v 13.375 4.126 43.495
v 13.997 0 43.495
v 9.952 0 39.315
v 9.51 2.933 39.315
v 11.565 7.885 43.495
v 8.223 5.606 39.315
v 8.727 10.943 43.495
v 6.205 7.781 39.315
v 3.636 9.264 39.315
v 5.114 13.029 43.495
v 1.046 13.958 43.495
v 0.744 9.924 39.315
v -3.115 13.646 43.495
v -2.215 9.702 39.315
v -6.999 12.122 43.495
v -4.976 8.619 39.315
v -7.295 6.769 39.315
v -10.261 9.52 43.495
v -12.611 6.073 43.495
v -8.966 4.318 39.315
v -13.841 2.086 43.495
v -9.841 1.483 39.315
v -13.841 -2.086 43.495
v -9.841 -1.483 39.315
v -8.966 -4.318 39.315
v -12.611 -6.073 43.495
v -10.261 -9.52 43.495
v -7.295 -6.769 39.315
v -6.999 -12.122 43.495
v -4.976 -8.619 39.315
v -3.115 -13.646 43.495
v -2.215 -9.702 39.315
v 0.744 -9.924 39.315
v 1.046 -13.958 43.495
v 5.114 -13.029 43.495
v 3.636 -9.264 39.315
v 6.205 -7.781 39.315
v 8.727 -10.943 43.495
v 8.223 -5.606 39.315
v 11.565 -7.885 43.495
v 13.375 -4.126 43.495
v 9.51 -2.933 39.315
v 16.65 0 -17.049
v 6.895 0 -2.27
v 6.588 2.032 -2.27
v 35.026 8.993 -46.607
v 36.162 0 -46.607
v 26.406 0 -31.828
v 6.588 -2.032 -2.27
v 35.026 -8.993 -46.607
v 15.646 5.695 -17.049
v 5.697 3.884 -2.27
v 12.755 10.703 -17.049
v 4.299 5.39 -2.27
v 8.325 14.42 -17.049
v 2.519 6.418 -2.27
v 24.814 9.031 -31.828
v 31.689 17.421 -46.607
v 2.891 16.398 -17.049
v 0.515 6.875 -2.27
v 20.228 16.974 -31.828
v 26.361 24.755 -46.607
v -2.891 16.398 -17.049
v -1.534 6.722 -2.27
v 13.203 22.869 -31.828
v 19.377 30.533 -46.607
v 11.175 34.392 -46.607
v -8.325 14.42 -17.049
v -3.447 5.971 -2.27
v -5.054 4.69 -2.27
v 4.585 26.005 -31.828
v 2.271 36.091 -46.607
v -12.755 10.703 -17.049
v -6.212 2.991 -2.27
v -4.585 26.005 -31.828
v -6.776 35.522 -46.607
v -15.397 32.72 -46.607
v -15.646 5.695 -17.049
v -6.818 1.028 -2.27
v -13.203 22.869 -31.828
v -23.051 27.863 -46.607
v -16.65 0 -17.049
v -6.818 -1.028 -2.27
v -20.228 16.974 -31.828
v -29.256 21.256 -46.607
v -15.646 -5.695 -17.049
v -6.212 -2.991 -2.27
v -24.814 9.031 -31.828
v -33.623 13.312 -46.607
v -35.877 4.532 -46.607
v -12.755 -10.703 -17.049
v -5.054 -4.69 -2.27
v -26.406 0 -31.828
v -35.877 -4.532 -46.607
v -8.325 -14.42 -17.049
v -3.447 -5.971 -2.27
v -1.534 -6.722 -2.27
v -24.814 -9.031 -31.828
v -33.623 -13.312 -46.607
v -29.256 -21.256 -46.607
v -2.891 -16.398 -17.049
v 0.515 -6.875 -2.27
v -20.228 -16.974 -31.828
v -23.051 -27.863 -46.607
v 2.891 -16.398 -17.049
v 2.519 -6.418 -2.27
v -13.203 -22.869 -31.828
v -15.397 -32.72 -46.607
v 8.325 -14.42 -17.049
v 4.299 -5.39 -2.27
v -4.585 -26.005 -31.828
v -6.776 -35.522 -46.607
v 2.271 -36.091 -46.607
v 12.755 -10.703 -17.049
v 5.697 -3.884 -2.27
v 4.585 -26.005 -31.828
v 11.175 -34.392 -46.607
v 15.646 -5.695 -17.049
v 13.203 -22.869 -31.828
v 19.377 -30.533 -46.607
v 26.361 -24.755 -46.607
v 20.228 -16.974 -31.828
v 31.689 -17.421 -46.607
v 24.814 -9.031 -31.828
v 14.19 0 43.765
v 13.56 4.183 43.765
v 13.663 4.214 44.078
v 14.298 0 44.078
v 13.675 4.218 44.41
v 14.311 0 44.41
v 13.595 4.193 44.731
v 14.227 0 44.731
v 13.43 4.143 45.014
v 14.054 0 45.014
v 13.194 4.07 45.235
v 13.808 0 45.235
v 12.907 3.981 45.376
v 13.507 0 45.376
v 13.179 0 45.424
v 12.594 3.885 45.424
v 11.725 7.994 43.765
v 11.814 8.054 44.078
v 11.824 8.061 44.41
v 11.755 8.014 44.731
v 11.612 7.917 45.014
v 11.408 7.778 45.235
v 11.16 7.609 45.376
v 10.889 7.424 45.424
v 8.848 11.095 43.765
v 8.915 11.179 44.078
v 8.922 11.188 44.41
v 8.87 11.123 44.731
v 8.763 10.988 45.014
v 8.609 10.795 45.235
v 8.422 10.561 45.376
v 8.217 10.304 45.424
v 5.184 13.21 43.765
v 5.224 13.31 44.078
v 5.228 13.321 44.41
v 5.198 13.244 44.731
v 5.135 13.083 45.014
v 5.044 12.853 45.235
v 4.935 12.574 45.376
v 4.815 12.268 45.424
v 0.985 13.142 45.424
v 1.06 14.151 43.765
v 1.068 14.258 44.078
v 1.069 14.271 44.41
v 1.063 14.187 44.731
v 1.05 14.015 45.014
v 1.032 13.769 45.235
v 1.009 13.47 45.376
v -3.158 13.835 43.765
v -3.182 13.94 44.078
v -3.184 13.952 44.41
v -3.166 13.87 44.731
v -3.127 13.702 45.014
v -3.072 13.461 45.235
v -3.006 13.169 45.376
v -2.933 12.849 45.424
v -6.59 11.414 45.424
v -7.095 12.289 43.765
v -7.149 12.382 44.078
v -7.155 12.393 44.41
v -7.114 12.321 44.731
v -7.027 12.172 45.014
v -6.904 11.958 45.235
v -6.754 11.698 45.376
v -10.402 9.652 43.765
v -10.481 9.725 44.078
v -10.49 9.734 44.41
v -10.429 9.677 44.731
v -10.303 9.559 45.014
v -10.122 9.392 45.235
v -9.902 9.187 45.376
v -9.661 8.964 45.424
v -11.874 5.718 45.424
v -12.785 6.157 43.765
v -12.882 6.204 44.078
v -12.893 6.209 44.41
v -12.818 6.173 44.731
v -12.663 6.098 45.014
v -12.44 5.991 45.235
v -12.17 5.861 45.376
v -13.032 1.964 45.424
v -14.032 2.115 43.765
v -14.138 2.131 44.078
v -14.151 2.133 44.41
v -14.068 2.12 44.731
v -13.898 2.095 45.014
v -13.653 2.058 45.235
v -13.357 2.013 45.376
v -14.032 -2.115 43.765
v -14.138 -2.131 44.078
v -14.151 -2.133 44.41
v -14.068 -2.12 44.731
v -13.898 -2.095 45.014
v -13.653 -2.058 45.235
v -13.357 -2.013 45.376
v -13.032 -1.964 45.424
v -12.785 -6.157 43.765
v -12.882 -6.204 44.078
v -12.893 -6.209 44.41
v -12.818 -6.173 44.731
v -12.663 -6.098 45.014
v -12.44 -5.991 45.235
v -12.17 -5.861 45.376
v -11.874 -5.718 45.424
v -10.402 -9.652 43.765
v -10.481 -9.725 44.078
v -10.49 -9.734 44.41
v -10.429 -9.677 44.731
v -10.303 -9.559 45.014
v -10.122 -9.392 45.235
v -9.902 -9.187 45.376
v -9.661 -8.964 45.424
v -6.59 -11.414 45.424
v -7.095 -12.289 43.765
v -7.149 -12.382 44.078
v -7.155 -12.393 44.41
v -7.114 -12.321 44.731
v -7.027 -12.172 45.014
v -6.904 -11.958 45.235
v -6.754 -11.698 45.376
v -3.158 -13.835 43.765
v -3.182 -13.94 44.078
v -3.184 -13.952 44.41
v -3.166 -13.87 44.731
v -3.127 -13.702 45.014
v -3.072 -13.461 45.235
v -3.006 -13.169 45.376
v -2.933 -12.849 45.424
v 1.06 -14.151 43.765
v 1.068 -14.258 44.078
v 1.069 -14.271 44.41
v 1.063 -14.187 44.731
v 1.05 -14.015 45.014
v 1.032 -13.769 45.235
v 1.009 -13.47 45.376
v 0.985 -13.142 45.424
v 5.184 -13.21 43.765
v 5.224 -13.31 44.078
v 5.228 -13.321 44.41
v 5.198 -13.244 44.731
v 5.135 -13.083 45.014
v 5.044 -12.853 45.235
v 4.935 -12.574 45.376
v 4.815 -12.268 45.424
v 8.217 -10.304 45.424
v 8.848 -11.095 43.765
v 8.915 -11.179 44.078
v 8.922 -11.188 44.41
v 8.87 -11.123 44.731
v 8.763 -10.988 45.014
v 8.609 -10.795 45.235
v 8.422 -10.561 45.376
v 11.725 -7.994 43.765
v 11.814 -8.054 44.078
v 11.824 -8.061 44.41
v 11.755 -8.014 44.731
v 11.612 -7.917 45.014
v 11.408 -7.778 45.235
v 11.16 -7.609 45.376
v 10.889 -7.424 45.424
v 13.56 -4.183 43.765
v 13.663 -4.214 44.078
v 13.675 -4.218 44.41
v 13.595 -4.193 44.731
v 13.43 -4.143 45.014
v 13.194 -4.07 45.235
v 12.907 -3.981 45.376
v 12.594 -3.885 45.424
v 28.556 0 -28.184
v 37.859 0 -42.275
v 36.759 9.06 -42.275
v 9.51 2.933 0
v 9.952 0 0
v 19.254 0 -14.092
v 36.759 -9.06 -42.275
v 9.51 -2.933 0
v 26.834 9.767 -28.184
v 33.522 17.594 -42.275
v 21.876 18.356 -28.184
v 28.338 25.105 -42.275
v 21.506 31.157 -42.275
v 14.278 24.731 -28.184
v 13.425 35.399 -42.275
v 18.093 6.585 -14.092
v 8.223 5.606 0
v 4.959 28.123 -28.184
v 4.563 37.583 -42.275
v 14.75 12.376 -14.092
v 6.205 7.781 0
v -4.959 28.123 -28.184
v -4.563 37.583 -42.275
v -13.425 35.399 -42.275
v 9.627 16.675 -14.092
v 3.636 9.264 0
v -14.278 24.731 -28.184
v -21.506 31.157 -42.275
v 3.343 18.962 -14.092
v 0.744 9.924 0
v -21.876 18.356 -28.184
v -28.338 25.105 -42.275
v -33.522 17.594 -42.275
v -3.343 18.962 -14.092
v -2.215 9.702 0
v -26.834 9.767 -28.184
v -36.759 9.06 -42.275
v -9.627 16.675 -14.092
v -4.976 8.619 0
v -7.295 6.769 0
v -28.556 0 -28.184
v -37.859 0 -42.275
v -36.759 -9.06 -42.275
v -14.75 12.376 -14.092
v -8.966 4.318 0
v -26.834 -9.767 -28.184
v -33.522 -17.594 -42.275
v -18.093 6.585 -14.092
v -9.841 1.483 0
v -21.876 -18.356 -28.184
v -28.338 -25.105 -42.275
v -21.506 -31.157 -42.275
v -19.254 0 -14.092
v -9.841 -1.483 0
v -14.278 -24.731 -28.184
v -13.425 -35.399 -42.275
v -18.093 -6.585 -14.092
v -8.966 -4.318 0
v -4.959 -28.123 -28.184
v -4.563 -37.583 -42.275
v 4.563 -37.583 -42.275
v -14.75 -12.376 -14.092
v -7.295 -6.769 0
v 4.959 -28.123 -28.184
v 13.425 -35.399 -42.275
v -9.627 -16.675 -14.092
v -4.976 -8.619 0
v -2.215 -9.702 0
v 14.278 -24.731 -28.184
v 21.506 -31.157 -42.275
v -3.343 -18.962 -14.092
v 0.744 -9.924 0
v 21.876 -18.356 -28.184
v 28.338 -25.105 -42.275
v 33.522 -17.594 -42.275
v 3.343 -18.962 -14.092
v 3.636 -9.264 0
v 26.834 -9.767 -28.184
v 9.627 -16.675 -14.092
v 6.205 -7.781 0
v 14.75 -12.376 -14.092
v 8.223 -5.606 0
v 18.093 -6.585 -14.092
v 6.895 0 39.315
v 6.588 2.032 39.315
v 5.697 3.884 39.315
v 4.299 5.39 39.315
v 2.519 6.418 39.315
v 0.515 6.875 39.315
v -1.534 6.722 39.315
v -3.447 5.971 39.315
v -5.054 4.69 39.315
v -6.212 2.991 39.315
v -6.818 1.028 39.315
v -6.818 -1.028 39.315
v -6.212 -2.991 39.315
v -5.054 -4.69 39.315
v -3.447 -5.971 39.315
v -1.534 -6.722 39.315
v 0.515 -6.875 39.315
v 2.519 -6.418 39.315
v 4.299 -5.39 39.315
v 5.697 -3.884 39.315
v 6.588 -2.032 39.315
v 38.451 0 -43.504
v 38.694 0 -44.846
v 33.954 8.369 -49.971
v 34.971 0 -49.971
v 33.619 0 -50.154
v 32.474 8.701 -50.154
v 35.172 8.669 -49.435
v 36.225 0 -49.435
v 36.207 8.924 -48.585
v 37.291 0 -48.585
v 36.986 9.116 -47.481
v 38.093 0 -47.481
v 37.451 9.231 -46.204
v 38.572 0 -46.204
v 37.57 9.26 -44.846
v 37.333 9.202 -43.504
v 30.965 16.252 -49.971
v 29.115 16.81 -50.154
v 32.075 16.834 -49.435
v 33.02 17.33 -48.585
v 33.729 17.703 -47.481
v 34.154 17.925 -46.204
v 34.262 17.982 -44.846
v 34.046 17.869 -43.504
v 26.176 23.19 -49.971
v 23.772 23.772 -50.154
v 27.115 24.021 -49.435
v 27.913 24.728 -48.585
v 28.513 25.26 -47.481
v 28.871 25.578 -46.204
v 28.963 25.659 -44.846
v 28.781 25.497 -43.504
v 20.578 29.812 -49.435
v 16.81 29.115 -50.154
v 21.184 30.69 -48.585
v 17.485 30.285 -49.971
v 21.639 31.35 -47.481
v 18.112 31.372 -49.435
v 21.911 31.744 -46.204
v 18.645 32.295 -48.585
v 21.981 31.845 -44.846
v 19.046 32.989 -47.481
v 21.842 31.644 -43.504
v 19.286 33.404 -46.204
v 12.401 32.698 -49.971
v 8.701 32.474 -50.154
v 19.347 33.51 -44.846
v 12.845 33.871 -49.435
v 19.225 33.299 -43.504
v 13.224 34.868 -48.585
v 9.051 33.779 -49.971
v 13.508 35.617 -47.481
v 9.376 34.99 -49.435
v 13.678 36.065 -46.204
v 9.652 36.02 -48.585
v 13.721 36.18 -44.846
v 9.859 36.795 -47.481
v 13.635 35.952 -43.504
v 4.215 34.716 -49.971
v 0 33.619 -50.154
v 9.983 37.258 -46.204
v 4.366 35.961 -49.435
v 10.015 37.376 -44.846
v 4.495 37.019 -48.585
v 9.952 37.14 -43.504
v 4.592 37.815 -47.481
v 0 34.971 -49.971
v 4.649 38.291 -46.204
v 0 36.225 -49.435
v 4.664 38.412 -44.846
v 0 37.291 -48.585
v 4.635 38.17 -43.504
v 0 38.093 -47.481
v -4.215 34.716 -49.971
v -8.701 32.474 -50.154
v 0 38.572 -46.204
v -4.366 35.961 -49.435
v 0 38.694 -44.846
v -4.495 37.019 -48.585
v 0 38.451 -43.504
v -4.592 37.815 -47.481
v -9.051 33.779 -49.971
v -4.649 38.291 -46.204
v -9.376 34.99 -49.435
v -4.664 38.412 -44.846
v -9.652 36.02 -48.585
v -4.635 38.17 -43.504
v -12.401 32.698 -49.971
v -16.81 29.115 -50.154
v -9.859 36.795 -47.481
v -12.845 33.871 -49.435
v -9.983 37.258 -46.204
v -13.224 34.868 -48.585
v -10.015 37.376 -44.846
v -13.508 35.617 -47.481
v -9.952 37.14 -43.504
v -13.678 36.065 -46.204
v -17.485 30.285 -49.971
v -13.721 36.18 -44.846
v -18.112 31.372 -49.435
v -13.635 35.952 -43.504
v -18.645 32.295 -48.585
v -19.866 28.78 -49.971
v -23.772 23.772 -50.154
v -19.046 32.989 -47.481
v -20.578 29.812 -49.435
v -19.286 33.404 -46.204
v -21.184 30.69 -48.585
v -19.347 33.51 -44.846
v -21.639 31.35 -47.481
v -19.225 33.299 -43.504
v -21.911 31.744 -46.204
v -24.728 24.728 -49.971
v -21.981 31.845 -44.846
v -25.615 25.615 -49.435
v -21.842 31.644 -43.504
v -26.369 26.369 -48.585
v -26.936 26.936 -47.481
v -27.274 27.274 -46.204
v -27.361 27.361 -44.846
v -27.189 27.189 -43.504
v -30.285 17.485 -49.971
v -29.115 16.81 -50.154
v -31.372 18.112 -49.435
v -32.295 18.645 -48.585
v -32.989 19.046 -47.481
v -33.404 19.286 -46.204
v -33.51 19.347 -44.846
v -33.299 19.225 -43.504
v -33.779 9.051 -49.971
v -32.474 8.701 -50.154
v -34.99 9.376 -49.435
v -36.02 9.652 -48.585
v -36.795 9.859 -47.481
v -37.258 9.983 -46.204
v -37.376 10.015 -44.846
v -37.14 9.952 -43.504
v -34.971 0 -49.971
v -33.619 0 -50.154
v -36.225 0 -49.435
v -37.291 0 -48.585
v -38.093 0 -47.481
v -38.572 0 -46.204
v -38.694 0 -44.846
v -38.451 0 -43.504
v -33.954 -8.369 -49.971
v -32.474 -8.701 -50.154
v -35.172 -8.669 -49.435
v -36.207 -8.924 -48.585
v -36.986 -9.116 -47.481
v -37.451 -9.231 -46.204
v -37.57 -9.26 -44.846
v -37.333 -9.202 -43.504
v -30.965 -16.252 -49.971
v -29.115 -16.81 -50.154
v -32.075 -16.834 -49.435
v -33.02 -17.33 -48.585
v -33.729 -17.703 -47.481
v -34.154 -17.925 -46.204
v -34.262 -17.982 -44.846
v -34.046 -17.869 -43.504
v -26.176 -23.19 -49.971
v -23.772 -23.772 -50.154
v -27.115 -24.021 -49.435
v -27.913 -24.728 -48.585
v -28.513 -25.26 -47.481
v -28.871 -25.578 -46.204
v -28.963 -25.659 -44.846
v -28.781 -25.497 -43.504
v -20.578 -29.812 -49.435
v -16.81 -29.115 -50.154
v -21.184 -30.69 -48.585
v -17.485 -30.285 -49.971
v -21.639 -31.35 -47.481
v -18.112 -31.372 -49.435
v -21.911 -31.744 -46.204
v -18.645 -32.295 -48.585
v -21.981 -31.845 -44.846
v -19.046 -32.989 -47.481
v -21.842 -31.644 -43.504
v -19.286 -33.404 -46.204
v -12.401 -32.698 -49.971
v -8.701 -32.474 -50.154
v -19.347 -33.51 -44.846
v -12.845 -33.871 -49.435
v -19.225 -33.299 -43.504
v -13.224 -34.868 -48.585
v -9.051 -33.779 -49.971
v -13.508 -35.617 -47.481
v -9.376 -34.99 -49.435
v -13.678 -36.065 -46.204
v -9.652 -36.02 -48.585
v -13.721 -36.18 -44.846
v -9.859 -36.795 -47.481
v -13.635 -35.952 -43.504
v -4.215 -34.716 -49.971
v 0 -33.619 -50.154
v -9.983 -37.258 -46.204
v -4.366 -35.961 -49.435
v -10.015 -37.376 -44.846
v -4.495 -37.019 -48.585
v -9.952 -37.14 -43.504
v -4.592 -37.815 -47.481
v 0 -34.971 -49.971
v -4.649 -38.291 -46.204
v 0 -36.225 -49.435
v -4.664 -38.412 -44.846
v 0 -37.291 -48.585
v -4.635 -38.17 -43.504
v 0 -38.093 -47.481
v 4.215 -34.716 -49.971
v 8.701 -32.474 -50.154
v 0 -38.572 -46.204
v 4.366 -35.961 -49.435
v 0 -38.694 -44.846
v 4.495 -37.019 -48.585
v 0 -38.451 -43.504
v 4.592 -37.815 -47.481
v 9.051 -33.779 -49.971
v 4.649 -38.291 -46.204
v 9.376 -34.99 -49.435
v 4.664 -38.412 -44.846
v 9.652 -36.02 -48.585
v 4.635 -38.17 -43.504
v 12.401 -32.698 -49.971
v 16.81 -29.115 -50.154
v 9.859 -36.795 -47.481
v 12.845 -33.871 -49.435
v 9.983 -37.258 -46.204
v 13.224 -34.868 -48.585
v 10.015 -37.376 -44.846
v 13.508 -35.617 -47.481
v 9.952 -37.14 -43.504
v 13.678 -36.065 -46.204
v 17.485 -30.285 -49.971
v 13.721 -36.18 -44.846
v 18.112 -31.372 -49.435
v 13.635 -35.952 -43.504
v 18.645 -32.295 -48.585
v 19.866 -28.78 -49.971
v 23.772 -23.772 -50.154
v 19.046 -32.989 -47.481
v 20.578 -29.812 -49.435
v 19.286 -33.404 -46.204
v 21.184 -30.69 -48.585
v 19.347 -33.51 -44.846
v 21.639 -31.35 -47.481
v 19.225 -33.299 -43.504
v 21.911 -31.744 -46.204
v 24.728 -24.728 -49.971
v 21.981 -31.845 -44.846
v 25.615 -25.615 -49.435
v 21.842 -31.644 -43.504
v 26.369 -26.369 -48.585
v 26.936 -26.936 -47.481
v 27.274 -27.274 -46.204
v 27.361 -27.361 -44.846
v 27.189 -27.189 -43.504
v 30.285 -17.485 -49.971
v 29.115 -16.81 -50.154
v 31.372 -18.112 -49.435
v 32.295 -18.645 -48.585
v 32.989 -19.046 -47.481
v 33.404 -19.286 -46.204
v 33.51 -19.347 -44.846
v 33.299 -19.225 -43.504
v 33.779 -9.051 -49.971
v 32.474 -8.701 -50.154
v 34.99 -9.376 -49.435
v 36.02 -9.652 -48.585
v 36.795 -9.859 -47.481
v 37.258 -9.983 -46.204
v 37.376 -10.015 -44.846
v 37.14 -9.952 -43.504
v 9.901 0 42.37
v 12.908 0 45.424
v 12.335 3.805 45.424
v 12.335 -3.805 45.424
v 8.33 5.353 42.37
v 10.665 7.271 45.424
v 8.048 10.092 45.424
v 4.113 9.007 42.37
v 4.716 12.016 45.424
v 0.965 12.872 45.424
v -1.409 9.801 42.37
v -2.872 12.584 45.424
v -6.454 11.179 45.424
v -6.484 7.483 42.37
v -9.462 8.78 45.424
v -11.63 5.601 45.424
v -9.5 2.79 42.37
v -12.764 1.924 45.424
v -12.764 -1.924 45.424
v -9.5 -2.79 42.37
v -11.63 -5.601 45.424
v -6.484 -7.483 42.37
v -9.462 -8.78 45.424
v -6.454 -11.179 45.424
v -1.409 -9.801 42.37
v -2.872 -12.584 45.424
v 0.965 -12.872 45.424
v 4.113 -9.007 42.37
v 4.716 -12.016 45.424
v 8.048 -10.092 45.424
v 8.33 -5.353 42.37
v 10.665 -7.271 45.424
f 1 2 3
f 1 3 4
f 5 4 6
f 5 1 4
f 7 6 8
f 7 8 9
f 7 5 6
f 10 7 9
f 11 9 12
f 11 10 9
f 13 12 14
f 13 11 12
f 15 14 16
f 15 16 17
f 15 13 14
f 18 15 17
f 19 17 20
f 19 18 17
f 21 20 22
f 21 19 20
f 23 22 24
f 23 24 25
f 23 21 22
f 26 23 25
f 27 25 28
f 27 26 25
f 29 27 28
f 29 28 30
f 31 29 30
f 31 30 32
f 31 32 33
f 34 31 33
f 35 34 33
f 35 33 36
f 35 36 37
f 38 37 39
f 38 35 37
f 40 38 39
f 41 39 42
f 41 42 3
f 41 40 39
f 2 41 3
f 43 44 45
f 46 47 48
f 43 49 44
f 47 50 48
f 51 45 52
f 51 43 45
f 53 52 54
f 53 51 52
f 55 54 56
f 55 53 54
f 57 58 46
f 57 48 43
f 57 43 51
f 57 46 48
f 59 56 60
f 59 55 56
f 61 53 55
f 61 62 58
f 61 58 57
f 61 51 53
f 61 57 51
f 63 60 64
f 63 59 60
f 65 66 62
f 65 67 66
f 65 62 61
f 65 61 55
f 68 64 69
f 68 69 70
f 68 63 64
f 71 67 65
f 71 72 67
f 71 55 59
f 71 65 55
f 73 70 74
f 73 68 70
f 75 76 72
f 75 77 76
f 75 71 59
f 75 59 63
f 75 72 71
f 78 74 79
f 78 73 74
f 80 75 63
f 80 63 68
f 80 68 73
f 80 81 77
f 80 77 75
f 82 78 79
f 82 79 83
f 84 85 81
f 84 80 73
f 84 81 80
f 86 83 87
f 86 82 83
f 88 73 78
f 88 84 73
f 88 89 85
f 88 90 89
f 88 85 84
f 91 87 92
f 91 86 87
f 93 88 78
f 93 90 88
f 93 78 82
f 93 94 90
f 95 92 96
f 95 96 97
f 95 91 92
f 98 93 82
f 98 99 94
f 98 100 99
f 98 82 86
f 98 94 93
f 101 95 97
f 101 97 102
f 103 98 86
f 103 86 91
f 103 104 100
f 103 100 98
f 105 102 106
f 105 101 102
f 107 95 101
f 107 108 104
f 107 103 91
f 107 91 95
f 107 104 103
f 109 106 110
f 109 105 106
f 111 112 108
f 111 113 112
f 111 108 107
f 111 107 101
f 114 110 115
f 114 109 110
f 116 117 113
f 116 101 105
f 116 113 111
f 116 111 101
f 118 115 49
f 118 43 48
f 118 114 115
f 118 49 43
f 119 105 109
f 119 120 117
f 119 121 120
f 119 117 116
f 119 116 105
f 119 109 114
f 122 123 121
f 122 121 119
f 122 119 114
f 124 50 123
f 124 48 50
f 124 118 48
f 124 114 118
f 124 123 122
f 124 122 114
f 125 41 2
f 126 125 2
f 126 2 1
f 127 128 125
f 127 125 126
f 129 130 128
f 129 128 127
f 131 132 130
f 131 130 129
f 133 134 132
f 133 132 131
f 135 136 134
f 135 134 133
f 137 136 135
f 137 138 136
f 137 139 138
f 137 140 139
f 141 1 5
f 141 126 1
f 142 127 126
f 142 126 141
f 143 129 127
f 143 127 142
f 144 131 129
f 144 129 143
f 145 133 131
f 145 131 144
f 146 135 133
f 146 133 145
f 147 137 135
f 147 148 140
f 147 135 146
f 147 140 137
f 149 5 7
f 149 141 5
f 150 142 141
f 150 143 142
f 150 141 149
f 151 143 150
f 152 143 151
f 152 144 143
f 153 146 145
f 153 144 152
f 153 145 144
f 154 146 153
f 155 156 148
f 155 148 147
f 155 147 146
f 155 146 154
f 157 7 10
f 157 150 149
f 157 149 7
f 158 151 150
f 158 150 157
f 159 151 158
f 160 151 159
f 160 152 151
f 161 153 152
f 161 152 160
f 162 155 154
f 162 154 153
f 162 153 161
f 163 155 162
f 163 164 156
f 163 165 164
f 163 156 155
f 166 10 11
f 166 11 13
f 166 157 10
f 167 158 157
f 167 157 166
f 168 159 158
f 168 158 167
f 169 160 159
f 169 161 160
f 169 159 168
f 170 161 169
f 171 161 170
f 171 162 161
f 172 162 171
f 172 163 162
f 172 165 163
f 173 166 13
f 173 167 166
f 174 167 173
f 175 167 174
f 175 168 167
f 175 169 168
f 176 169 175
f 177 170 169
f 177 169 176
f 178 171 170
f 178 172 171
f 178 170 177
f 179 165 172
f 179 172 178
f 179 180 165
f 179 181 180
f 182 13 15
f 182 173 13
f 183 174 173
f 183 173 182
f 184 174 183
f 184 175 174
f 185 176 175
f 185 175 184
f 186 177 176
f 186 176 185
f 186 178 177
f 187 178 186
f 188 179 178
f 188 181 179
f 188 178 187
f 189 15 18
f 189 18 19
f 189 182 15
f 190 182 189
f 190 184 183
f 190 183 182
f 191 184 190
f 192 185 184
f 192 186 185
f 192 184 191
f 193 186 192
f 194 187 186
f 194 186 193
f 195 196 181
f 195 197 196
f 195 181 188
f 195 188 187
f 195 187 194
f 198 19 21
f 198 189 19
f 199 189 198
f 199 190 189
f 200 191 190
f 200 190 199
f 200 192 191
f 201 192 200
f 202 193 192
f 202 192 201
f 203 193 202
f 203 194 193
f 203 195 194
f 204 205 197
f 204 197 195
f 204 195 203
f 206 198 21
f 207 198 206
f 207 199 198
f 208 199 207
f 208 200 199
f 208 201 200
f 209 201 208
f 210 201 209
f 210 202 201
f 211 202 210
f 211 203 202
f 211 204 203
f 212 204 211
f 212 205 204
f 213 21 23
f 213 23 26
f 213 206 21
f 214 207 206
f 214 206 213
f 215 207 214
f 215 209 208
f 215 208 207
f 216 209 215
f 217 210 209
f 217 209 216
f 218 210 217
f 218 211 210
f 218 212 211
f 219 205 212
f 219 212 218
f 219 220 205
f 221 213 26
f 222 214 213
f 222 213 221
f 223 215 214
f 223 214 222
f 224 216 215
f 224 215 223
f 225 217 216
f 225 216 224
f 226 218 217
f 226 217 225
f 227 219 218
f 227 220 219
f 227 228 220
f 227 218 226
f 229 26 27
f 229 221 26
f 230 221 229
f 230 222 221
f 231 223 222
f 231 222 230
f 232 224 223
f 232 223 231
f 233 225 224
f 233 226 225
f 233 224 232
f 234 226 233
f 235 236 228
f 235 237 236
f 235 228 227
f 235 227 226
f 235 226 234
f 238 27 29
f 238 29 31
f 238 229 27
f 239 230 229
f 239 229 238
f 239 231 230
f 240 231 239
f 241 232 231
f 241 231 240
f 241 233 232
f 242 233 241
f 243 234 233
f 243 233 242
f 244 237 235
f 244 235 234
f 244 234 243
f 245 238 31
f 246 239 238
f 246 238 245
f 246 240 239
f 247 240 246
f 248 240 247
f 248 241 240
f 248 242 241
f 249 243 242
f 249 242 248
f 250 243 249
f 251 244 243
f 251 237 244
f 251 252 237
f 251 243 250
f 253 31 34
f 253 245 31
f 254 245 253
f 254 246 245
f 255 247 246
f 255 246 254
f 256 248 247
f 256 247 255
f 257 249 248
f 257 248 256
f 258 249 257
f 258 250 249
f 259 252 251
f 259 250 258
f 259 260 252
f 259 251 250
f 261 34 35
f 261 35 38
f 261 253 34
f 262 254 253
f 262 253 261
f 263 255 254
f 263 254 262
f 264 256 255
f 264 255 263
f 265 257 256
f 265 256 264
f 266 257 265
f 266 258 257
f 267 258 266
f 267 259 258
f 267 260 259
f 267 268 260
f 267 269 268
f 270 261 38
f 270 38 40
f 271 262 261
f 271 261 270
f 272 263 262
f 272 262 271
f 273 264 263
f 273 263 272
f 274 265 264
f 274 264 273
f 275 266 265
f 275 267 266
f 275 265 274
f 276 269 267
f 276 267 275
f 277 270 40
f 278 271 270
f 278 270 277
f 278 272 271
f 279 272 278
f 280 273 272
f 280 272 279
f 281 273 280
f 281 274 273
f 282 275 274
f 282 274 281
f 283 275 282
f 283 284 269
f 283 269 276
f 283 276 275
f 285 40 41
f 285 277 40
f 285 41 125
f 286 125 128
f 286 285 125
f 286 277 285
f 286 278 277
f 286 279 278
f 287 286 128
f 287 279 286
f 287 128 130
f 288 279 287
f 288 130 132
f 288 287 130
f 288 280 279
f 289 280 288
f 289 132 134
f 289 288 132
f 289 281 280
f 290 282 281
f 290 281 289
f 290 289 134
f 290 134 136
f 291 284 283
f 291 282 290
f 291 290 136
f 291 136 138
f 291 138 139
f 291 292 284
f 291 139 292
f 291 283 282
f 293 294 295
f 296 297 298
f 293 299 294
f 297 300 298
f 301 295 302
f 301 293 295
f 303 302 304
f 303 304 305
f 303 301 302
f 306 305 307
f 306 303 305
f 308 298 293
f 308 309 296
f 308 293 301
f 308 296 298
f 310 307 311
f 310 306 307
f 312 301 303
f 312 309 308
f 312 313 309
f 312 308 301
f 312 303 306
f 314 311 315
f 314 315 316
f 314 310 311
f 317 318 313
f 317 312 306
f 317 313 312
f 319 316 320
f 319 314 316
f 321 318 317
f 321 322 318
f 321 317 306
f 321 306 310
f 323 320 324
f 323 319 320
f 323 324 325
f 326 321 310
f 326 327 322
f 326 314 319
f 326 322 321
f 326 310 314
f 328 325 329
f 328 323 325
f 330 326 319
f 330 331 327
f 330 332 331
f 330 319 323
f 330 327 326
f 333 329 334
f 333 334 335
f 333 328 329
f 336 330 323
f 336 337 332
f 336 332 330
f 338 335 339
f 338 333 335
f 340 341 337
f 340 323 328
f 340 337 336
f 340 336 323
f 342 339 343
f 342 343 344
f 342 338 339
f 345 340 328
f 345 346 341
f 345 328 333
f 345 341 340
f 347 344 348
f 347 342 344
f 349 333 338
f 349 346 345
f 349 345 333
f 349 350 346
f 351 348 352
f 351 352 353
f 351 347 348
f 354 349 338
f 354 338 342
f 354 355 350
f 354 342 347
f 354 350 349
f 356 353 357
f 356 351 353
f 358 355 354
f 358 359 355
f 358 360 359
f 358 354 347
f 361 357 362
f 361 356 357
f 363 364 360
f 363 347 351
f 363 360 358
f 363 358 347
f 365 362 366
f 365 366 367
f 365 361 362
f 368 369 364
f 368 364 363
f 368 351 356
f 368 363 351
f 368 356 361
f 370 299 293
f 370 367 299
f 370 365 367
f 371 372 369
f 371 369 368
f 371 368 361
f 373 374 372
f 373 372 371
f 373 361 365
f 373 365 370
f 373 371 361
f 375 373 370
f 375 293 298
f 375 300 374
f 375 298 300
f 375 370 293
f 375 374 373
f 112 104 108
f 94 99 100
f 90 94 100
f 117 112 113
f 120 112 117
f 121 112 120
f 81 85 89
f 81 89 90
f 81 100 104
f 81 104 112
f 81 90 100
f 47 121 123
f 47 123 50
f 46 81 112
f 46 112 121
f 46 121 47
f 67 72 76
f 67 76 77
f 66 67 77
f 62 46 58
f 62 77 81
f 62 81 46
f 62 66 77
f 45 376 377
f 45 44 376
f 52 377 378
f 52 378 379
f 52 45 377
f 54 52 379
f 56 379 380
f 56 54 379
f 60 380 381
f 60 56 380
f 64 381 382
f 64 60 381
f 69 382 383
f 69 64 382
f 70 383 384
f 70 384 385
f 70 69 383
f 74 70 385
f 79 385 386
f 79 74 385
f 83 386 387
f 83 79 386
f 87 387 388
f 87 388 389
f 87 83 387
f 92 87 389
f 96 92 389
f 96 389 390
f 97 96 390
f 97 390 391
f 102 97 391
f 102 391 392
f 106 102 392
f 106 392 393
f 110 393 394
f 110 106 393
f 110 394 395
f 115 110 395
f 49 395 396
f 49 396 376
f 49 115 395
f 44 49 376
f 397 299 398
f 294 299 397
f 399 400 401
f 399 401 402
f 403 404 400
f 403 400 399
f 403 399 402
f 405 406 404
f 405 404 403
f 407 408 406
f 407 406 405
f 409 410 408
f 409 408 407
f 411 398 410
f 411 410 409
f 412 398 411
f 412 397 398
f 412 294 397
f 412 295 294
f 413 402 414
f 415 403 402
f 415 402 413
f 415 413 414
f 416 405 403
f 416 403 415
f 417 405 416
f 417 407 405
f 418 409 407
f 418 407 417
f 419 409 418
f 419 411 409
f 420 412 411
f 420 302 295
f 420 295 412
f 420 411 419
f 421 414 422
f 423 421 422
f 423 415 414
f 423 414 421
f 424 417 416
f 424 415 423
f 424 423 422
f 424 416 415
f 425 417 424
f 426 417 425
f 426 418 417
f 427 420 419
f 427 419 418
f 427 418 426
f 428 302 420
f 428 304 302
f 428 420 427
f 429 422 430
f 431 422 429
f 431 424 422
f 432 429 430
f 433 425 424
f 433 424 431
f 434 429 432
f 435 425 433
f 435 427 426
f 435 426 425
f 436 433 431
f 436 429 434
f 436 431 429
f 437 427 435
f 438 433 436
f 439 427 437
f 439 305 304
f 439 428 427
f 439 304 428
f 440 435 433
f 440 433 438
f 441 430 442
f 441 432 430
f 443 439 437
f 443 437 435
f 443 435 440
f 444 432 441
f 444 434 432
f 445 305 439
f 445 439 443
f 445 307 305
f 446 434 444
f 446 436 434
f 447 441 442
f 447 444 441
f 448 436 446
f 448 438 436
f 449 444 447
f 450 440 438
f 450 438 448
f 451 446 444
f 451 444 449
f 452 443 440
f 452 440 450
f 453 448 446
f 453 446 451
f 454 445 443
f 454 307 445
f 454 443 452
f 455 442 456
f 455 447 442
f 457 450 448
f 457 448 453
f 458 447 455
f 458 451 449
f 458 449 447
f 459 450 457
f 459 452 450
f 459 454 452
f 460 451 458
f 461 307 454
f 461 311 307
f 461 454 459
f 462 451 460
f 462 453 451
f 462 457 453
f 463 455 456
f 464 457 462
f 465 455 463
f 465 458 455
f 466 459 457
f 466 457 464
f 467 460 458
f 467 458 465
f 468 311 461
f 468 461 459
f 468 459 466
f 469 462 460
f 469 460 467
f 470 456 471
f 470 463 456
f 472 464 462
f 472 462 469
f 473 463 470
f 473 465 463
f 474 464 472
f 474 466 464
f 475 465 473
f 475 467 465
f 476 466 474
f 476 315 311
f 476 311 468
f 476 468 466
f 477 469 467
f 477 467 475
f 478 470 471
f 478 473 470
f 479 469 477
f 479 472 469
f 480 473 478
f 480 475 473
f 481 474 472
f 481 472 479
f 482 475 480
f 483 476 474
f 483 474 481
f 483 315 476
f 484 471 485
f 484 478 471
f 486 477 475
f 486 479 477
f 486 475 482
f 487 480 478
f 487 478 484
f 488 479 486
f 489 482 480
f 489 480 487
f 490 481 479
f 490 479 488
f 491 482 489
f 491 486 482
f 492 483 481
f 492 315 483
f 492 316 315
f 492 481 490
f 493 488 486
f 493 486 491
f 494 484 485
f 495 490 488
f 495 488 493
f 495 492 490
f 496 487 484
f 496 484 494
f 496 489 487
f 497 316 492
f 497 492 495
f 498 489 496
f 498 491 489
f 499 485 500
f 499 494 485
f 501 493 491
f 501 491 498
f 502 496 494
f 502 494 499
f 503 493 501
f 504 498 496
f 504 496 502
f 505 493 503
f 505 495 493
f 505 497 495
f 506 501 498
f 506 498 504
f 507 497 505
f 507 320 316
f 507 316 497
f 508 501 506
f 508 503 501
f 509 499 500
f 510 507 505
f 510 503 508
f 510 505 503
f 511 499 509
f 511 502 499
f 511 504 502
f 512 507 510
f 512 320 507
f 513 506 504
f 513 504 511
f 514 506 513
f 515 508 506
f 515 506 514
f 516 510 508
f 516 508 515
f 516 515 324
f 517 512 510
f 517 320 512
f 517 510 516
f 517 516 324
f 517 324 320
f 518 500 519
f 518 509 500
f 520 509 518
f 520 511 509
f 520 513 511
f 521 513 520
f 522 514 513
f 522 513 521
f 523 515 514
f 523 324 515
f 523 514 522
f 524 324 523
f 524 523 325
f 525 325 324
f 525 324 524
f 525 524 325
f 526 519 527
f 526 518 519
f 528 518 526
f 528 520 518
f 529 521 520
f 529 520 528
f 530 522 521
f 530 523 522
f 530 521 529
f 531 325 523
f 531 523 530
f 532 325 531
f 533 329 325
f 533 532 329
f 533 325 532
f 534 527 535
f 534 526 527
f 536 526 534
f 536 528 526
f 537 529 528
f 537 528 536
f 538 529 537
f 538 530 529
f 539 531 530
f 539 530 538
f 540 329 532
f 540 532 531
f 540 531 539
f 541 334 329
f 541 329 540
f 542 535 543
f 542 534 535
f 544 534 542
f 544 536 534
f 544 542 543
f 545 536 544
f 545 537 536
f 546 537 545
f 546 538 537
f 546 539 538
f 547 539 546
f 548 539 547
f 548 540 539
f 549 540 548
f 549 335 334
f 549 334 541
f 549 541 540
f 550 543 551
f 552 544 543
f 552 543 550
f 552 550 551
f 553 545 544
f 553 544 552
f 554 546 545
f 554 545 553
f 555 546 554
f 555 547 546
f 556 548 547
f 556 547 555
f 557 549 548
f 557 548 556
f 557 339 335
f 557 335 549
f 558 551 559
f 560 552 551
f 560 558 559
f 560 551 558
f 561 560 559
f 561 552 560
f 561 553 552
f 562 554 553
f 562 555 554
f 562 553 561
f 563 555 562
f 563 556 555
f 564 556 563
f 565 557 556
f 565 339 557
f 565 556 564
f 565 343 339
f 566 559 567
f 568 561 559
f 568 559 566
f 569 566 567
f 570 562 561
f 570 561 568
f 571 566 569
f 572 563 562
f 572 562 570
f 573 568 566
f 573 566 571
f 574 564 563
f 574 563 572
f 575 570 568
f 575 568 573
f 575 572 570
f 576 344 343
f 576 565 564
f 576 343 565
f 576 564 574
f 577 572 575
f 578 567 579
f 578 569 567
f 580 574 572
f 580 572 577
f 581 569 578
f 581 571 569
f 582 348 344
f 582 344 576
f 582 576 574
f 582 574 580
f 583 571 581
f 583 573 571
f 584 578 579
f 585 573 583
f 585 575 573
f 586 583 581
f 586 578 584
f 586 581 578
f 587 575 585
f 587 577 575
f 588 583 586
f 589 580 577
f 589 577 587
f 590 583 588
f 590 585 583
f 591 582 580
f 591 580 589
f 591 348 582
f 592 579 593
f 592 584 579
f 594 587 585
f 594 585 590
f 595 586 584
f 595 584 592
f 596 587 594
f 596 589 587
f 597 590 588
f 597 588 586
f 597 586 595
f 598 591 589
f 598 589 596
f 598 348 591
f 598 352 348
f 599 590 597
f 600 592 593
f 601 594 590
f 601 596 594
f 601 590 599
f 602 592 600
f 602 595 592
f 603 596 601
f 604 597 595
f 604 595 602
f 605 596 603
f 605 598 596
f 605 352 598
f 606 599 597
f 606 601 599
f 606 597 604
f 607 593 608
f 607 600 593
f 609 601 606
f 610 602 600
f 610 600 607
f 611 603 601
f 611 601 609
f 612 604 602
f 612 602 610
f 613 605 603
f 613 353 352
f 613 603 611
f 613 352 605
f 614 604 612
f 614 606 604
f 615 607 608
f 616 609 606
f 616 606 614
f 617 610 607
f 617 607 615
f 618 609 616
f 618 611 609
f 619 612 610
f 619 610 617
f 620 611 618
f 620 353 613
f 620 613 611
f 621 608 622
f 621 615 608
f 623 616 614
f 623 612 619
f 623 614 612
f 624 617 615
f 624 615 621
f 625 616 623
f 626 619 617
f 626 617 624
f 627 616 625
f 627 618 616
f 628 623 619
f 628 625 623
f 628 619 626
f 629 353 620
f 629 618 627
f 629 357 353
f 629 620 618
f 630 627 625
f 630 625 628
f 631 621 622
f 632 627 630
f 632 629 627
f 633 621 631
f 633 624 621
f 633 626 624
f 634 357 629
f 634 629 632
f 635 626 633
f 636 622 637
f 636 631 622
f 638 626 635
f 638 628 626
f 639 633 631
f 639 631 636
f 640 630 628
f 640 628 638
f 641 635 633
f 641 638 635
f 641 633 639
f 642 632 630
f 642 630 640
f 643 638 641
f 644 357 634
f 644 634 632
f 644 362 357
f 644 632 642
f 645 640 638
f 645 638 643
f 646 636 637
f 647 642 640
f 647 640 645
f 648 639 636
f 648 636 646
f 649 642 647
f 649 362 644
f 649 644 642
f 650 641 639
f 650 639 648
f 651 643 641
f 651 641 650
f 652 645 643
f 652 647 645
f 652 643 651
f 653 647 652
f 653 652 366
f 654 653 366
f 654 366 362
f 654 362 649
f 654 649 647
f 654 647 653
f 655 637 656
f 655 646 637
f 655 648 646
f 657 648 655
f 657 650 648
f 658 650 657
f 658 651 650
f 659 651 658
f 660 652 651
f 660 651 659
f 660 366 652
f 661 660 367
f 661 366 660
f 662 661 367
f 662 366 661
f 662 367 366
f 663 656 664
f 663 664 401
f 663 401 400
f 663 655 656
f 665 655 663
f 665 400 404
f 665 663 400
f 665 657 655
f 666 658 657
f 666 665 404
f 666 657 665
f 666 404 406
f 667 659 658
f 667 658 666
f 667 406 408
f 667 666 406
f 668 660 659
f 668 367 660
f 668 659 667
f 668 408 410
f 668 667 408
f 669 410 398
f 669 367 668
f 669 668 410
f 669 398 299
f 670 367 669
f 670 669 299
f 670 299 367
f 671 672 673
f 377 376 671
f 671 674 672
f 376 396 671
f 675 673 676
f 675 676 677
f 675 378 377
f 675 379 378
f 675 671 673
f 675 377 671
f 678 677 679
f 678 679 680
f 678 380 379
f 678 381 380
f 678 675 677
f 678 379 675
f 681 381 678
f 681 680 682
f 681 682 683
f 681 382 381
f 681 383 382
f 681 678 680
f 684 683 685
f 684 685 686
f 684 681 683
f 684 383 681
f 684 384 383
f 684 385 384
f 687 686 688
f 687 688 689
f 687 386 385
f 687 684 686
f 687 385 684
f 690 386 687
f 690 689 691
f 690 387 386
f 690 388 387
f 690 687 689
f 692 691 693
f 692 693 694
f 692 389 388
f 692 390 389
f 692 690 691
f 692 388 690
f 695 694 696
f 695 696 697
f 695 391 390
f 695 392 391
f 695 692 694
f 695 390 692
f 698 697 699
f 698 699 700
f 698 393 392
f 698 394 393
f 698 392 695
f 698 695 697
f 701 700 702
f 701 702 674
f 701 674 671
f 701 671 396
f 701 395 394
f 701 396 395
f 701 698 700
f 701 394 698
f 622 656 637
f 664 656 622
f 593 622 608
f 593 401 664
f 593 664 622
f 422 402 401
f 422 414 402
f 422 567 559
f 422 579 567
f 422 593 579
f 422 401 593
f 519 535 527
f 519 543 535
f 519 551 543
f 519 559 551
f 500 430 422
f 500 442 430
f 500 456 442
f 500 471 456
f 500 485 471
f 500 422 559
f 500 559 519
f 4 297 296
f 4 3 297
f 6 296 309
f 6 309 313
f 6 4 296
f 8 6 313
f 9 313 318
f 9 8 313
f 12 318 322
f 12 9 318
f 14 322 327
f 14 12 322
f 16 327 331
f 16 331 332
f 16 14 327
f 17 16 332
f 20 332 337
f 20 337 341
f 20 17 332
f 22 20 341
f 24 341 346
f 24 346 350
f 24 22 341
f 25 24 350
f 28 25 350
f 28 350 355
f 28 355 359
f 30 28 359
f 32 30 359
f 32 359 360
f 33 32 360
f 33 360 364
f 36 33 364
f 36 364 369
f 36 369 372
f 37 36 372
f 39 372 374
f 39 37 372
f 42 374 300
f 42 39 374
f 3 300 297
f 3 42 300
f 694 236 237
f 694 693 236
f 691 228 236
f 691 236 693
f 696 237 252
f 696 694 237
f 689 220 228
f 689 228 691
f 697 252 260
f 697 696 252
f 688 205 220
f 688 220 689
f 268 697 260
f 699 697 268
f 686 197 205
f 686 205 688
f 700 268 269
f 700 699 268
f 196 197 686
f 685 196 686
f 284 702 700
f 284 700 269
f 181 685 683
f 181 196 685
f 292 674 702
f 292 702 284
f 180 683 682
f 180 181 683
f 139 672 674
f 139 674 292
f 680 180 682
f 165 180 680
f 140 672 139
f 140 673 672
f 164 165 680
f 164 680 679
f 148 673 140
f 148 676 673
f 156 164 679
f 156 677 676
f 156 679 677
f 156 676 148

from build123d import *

# Parameters (mm, degrees)
F2_R = 5.08
F3_R = 1.137914


with BuildPart() as f1:
    # F0 (on Front) → F1 (revolve)
    with BuildSketch(Plane.XZ):
        Polygon((15.86405, 45.424398), (12.908017, 45.424398), (6.894663, 39.315261), (6.894663, -2.270045), (36.162157, -46.606813), (0, -46.606813), (0, -50.154049), (43.059569, -50.154049), (9.951984, 0), (9.951984, 39.315261), align=None)
    revolve(axis=Axis((0, 0, -48.380431), (0, 0, 1)))

    # F2
    f2_edges = [f1.edges().sort_by_distance(p)[0] for p in [
        (-43.059569, 0, -50.154049),
    ]]
    fillet(f2_edges, radius=F2_R)

    # F3
    f3_edges = [f1.edges().sort_by_distance(p)[0] for p in [
        (-15.86405, 0, 45.424398),
    ]]
    fillet(f3_edges, radius=F3_R)


solid = f1.part
